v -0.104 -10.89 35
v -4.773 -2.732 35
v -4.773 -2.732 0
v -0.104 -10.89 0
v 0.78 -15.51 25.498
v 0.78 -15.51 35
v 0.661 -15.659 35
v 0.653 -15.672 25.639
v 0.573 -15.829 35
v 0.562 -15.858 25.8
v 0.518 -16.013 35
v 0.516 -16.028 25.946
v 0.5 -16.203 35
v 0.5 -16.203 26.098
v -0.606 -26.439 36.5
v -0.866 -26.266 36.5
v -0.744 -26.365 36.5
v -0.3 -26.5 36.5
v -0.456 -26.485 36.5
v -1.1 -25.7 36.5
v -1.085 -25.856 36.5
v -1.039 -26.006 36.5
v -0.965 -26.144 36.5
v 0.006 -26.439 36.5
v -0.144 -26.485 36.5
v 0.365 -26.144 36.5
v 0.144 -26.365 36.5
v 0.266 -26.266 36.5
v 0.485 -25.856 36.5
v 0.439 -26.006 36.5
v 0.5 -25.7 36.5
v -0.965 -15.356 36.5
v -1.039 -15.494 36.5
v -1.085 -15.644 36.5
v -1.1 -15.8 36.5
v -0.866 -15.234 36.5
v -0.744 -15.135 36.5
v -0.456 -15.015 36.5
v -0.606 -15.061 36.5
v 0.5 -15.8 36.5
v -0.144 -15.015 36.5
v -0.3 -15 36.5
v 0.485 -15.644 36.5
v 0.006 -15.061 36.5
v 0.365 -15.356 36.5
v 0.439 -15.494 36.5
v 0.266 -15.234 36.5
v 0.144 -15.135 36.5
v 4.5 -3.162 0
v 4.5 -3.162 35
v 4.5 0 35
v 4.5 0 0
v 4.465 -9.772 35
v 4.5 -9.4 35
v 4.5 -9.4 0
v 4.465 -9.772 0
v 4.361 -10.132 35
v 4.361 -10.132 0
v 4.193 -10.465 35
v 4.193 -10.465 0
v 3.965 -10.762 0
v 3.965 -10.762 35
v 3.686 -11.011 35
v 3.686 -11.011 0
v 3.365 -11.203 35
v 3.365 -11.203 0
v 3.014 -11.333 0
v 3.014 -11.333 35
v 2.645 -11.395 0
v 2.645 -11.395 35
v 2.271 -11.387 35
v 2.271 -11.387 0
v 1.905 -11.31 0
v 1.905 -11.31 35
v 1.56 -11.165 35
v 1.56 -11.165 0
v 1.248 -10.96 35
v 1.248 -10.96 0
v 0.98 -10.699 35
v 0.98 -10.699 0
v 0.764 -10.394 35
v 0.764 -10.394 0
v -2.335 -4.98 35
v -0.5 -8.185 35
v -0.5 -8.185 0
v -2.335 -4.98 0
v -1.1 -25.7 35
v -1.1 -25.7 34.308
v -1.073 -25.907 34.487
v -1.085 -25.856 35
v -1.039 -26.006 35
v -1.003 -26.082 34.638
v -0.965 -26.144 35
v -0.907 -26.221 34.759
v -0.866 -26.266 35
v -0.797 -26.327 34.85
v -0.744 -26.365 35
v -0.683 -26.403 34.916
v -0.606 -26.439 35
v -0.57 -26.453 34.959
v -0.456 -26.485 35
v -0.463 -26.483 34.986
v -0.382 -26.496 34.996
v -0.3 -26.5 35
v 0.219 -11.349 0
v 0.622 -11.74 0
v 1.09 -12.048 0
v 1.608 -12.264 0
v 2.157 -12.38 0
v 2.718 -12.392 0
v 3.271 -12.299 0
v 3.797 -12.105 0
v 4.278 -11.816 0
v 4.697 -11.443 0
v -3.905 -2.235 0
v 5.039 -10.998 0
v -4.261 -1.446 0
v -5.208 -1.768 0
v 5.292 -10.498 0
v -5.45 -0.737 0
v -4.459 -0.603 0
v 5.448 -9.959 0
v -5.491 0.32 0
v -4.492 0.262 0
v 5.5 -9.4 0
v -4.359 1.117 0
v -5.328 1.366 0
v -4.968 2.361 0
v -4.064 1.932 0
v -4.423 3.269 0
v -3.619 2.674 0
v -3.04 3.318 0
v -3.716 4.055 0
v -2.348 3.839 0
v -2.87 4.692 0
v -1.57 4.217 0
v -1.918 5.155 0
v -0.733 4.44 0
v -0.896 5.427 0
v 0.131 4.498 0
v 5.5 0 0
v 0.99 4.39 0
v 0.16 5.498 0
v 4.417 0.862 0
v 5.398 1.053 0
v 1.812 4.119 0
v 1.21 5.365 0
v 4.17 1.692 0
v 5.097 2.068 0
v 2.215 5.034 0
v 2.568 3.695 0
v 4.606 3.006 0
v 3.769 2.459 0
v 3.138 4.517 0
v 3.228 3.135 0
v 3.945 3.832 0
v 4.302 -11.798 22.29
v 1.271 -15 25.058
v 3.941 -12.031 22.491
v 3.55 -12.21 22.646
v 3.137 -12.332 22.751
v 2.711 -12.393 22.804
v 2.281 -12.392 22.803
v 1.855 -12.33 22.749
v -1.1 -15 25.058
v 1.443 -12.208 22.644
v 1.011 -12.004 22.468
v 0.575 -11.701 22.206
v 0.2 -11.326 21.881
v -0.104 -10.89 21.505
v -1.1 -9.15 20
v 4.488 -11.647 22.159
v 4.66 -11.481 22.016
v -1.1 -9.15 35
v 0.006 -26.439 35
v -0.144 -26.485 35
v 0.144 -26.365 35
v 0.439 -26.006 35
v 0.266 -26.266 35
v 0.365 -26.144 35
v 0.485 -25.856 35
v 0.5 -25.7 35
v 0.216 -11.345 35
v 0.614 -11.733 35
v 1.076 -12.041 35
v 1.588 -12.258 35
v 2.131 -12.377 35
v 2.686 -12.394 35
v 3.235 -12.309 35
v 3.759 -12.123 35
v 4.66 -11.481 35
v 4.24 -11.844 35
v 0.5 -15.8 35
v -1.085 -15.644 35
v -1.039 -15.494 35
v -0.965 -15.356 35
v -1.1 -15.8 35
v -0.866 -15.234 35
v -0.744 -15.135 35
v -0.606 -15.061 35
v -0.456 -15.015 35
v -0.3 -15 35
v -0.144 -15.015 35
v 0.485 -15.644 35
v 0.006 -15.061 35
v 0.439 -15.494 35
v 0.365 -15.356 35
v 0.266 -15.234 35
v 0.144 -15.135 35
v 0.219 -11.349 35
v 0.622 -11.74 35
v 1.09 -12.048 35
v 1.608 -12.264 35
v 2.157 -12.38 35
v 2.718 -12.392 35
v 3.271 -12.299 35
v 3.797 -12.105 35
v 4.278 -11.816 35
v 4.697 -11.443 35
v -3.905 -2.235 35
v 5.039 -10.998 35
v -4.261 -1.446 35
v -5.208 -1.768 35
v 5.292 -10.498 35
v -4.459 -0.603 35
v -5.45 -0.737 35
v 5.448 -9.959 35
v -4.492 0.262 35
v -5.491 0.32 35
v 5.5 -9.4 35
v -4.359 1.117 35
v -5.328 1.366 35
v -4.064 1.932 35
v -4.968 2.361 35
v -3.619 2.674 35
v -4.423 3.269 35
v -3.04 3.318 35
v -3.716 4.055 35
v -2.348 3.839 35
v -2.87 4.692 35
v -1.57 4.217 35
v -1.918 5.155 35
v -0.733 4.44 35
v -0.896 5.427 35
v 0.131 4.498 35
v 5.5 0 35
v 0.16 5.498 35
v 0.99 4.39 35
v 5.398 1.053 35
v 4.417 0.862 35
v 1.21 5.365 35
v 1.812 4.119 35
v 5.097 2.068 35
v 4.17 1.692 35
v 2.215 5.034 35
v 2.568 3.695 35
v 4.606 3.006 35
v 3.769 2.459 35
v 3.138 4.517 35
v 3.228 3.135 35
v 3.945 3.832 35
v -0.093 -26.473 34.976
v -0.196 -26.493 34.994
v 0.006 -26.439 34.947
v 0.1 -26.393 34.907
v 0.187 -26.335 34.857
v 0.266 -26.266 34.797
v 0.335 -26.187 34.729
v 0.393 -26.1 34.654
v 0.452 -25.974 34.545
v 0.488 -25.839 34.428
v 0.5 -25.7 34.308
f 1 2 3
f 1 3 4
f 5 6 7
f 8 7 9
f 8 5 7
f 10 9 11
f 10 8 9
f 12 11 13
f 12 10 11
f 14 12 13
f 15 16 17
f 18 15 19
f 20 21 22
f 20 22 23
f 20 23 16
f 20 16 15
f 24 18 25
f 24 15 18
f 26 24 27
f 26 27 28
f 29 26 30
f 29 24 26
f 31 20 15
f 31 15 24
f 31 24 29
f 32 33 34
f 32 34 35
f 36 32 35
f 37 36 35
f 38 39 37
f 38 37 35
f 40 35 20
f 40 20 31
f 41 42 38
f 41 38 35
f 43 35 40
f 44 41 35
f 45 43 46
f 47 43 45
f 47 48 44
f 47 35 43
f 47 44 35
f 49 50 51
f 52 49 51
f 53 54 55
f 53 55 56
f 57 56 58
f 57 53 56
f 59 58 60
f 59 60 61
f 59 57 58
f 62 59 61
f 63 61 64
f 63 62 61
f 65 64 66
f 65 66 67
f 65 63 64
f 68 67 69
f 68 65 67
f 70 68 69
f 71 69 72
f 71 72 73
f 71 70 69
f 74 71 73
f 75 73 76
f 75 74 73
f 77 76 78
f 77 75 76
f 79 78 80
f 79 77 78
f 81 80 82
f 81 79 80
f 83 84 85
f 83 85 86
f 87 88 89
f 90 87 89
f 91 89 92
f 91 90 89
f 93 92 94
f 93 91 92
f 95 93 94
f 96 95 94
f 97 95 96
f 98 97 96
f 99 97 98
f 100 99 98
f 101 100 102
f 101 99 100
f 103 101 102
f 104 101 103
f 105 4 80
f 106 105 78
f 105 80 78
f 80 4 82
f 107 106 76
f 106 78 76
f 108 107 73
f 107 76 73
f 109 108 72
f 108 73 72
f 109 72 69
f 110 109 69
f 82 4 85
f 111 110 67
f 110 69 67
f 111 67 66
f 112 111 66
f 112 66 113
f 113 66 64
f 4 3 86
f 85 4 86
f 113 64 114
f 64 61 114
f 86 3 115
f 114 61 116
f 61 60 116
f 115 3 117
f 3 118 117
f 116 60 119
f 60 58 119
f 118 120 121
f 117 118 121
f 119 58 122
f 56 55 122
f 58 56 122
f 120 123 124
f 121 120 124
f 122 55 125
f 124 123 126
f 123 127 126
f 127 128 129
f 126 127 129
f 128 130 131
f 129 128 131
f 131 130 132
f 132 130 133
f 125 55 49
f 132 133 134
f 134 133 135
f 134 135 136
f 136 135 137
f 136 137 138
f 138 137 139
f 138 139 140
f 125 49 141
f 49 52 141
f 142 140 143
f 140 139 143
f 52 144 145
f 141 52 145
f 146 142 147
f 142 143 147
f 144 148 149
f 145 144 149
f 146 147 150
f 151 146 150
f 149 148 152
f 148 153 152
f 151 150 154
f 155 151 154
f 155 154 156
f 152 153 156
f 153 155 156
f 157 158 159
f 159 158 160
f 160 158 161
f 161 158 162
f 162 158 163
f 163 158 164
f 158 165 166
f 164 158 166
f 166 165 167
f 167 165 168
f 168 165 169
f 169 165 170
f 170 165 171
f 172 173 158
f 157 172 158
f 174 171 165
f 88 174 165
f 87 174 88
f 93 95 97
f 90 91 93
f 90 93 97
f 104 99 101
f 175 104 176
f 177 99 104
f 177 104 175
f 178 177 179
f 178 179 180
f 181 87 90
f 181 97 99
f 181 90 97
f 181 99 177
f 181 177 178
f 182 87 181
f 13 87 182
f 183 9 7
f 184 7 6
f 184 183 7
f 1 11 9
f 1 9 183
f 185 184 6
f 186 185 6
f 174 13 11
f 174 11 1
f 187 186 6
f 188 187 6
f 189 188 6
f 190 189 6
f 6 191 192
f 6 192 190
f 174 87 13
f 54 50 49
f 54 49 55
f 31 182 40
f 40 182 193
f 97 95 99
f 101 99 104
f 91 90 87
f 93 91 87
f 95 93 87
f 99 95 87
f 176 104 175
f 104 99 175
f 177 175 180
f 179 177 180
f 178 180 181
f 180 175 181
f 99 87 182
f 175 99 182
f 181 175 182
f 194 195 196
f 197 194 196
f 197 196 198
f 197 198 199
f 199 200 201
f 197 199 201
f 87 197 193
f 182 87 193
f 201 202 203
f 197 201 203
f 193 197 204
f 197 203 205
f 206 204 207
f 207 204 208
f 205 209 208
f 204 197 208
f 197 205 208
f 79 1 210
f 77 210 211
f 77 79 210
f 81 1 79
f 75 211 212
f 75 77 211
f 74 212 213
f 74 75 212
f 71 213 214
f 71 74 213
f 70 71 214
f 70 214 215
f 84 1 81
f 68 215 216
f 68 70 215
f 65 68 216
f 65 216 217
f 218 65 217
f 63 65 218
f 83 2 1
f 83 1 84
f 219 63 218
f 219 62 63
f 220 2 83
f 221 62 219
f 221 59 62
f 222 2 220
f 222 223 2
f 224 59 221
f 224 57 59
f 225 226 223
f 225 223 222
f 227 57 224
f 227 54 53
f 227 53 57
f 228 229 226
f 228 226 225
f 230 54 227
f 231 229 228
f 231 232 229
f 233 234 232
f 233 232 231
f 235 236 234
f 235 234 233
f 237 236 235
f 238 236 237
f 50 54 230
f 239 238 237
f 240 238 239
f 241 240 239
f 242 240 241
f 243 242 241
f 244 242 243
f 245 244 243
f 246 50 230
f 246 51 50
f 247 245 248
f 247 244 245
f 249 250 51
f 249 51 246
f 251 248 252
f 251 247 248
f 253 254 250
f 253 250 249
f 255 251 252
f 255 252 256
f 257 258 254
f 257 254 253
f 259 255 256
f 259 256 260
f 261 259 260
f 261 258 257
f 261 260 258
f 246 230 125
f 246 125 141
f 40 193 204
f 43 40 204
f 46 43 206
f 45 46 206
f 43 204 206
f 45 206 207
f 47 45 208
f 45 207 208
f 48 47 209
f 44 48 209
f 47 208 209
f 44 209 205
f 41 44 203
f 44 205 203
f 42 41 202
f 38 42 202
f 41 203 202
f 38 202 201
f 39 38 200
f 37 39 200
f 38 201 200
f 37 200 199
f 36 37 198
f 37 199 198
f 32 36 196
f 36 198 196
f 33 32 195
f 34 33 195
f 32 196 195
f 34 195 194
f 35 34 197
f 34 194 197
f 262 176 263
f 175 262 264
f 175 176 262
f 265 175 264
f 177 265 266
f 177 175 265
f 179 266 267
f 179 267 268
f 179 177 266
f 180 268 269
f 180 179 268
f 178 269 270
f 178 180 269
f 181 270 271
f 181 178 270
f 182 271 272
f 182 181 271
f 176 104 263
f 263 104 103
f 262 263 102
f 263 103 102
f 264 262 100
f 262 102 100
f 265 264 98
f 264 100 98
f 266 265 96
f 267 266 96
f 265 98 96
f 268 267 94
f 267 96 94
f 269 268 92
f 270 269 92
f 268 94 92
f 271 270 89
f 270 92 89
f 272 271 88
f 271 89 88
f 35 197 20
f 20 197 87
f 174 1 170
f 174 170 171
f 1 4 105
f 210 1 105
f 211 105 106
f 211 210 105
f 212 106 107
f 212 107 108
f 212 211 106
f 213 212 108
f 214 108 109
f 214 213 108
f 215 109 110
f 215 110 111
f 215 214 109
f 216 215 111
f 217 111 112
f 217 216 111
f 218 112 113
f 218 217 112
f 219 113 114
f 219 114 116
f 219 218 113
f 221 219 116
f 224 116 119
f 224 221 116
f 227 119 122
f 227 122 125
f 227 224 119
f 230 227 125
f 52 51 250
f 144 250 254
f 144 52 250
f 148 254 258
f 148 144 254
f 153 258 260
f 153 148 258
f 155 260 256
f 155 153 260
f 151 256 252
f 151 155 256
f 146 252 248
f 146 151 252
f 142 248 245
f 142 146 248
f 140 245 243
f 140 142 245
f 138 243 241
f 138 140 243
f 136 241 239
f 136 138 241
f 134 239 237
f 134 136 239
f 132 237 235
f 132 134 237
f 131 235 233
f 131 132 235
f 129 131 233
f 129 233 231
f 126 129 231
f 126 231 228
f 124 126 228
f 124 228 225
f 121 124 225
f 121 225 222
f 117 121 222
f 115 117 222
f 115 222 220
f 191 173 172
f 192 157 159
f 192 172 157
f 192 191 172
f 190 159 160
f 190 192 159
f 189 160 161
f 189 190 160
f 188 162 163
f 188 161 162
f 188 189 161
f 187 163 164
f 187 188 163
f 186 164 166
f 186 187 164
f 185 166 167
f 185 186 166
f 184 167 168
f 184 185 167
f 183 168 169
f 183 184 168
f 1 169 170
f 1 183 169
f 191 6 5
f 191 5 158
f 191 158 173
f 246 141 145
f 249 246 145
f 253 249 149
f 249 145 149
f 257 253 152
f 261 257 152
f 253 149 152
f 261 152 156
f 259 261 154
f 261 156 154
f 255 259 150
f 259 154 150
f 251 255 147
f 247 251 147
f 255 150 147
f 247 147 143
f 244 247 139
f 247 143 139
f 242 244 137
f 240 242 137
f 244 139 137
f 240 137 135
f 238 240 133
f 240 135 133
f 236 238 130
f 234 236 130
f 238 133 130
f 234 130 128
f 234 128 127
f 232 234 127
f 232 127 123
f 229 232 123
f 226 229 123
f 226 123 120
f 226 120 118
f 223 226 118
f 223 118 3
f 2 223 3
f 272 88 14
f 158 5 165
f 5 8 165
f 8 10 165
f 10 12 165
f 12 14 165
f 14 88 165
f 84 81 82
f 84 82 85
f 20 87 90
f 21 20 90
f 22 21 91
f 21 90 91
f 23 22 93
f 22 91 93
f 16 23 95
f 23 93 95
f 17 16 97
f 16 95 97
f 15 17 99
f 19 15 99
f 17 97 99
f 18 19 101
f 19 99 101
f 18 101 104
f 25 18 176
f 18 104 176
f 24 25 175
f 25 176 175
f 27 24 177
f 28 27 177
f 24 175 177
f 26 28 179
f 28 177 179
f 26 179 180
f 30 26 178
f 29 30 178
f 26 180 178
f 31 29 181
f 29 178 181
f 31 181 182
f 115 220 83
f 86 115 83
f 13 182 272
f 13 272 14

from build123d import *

# Parameters (mm, degrees)
F0_R      = 5.5
F0_R_2    = 4.5
F1_DEPTH  = 35
F3_DEPTH  = 1.5
F5_DEPTH  = 35
F7_DEPTH  = 35
F9_DEPTH  = 35.001
F11_DEPTH = 15
F13_DEPTH = 25
F14_R     = 1


# Not quite as in the source:
# - ends of sketch curves that miss each other by under 0.0002 mm in the source are joined


with BuildPart() as f1:
    # F0 (on Top) → F1 (new body)
    with BuildSketch(Plane.XY):
        Circle(F0_R)
        Circle(F0_R_2, mode=Mode.SUBTRACT)
    extrude(amount=F1_DEPTH)

    # F6 (on face) → F7 (join)
    with BuildSketch(Plane.XY.offset(35)):
        with BuildLine():
            Line((-0.5, -9.4), (-0.5, -8.1848935982))
            Line((-0.5, -8.1848935982), (-2.3345095585, -4.9799663775))
            ThreePointArc((-2.3345095585, -4.9799663775), (-3.7273838867, -4.0443305207), (-4.773332625, -2.7322693226))
            Line((-4.773332625, -2.7322693226), (-0.1036359901, -10.8903286733))
            ThreePointArc((-0.1036359901, -10.8903286733), (-0.3992160983, -10.1710680876), (-0.5, -9.4))
        make_face()
        with BuildLine():
            ThreePointArc((5.5, 0), (5.2440441901, -1.6583125558), (4.4999998063, -3.1622779358))
            Line((4.4999998063, -3.1622779358), (4.4999998063, -9.4))
            ThreePointArc((4.4999998063, -9.4), (3.0140452866, -11.3328106364), (0.764242669, -10.3935524328))
            Line((0.764242669, -10.3935524328), (-0.5, -8.1848935982))
            Line((-0.5, -8.1848935982), (-0.5, -9.4))
            ThreePointArc((-0.5, -9.4), (-0.3992160983, -10.1710680876), (-0.1036359901, -10.8903286733))
            ThreePointArc((-0.1036359901, -10.8903286733), (3.2710679908, -12.2992160015), (5.4999998063, -9.4))
            Line((5.4999998063, -9.4), (5.5, 0))
        make_face()
    extrude(amount=-F7_DEPTH)

    # F8 (on face) → F9 (cut, through all)
    with BuildSketch(Plane.XY.offset(35)):
        with BuildLine():
            Line((-3.9054539659, -2.2354930822), (-2.3345095585, -4.9799663775))
            ThreePointArc((-2.3345095585, -4.9799663775), (1.4136247101, -5.3152295509), (4.4999998063, -3.1622779358))
            Line((4.4999998063, -3.1622779358), (4.5, 0))
            ThreePointArc((4.5, 0), (1.1566021688, -4.3488241426), (-3.9054539659, -2.2354930822))
        make_face()
    extrude(amount=-F9_DEPTH, mode=Mode.SUBTRACT)


with BuildPart() as f1b:
    # F0 (on Top) → F1, piece 2 (new body)
    with BuildSketch(Plane.XY):
        with BuildLine():
            Line((0.5, -25.7), (0.5, -15.8))
            ThreePointArc((0.5, -15.8), (-0.3, -15), (-1.1, -15.8))
            Line((-1.1, -15.8), (-1.1, -25.7))
            ThreePointArc((-1.1, -25.7), (-0.3, -26.5), (0.5, -25.7))
        make_face()
    extrude(amount=F1_DEPTH)

    # F4 (on face) → F5 (cut)
    with BuildSketch(Plane(origin=(0, 0, 0), x_dir=(1, 0, 0), z_dir=(0, 0, -1))):
        with BuildLine():
            Line((-1.1, 25.7), (-1.1, 15.8))
            ThreePointArc((-1.1, 15.8), (-0.3, 15), (0.5, 15.8))
            Line((0.5, 15.8), (0.5, 25.7))
            ThreePointArc((0.5, 25.7), (-0.3, 26.5), (-1.1, 25.7))
        make_face()
    extrude(amount=-F5_DEPTH, mode=Mode.SUBTRACT)


with BuildPart() as f3:
    # F2 (on face) → F3 (new body)
    with BuildSketch(Plane.XY.offset(35)):
        with BuildLine():
            Line((0.5, -25.7), (0.5, -15.8))
            ThreePointArc((0.5, -15.8), (-0.3, -15), (-1.1, -15.8))
            Line((-1.1, -15.8), (-1.1, -25.7))
            ThreePointArc((-1.1, -25.7), (-0.3, -26.5), (0.5, -25.7))
        make_face()
    extrude(amount=F3_DEPTH)


with BuildPart() as f11:
    # F10 (on face) → F11 (new body)
    with BuildSketch(Plane.XY.offset(35)):
        with BuildLine():
            ThreePointArc((-1.1, -15.8), (-0.3, -15), (0.5, -15.8))
            Line((0.5, -15.8), (4.6604977162, -11.4814054431))
            ThreePointArc((4.6604977162, -11.4814054431), (2.130627765, -12.3771737676), (-0.1036359901, -10.8903286733))
            Line((-0.1036359901, -10.8903286733), (-1.1, -9.1496595542))
            Line((-1.1, -9.1496595542), (-1.1, -15.8))
        make_face()
        with BuildLine():
            ThreePointArc((-1.1, -25.7), (-0.3, -26.5), (0.5, -25.7))
            Line((0.5, -25.7), (0.5, -15.8))
            ThreePointArc((0.5, -15.8), (-0.3, -15), (-1.1, -15.8))
            Line((-1.1, -15.8), (-1.1, -25.7))
        make_face()
    extrude(amount=-F11_DEPTH)

    # F12 (on face) → F13 (cut)
    with BuildSketch(Plane(origin=(-1.1, 0, 0), x_dir=(0, -1, 0), z_dir=(-1, 0, 0))):
        Polygon((15, 20), (15, 25.0578319752), (9.1496595542, 20), align=None)
        Polygon((25.7, 34.30837092), (15, 25.0578319752), (15, 20), (25.7, 20), align=None)
        Polygon((26.5, 20), (26.5, 35), (25.7, 34.30837092), (25.7, 20), align=None)
    extrude(amount=-F13_DEPTH, mode=Mode.SUBTRACT)

    # F14
    f14_edges = [f11.edges().sort_by_distance(p)[0] for p in [
        (0.5, -15.8, 30.374731),
    ]]
    fillet(f14_edges, radius=F14_R)


solid = Compound([f1.part, f3.part, f11.part])
